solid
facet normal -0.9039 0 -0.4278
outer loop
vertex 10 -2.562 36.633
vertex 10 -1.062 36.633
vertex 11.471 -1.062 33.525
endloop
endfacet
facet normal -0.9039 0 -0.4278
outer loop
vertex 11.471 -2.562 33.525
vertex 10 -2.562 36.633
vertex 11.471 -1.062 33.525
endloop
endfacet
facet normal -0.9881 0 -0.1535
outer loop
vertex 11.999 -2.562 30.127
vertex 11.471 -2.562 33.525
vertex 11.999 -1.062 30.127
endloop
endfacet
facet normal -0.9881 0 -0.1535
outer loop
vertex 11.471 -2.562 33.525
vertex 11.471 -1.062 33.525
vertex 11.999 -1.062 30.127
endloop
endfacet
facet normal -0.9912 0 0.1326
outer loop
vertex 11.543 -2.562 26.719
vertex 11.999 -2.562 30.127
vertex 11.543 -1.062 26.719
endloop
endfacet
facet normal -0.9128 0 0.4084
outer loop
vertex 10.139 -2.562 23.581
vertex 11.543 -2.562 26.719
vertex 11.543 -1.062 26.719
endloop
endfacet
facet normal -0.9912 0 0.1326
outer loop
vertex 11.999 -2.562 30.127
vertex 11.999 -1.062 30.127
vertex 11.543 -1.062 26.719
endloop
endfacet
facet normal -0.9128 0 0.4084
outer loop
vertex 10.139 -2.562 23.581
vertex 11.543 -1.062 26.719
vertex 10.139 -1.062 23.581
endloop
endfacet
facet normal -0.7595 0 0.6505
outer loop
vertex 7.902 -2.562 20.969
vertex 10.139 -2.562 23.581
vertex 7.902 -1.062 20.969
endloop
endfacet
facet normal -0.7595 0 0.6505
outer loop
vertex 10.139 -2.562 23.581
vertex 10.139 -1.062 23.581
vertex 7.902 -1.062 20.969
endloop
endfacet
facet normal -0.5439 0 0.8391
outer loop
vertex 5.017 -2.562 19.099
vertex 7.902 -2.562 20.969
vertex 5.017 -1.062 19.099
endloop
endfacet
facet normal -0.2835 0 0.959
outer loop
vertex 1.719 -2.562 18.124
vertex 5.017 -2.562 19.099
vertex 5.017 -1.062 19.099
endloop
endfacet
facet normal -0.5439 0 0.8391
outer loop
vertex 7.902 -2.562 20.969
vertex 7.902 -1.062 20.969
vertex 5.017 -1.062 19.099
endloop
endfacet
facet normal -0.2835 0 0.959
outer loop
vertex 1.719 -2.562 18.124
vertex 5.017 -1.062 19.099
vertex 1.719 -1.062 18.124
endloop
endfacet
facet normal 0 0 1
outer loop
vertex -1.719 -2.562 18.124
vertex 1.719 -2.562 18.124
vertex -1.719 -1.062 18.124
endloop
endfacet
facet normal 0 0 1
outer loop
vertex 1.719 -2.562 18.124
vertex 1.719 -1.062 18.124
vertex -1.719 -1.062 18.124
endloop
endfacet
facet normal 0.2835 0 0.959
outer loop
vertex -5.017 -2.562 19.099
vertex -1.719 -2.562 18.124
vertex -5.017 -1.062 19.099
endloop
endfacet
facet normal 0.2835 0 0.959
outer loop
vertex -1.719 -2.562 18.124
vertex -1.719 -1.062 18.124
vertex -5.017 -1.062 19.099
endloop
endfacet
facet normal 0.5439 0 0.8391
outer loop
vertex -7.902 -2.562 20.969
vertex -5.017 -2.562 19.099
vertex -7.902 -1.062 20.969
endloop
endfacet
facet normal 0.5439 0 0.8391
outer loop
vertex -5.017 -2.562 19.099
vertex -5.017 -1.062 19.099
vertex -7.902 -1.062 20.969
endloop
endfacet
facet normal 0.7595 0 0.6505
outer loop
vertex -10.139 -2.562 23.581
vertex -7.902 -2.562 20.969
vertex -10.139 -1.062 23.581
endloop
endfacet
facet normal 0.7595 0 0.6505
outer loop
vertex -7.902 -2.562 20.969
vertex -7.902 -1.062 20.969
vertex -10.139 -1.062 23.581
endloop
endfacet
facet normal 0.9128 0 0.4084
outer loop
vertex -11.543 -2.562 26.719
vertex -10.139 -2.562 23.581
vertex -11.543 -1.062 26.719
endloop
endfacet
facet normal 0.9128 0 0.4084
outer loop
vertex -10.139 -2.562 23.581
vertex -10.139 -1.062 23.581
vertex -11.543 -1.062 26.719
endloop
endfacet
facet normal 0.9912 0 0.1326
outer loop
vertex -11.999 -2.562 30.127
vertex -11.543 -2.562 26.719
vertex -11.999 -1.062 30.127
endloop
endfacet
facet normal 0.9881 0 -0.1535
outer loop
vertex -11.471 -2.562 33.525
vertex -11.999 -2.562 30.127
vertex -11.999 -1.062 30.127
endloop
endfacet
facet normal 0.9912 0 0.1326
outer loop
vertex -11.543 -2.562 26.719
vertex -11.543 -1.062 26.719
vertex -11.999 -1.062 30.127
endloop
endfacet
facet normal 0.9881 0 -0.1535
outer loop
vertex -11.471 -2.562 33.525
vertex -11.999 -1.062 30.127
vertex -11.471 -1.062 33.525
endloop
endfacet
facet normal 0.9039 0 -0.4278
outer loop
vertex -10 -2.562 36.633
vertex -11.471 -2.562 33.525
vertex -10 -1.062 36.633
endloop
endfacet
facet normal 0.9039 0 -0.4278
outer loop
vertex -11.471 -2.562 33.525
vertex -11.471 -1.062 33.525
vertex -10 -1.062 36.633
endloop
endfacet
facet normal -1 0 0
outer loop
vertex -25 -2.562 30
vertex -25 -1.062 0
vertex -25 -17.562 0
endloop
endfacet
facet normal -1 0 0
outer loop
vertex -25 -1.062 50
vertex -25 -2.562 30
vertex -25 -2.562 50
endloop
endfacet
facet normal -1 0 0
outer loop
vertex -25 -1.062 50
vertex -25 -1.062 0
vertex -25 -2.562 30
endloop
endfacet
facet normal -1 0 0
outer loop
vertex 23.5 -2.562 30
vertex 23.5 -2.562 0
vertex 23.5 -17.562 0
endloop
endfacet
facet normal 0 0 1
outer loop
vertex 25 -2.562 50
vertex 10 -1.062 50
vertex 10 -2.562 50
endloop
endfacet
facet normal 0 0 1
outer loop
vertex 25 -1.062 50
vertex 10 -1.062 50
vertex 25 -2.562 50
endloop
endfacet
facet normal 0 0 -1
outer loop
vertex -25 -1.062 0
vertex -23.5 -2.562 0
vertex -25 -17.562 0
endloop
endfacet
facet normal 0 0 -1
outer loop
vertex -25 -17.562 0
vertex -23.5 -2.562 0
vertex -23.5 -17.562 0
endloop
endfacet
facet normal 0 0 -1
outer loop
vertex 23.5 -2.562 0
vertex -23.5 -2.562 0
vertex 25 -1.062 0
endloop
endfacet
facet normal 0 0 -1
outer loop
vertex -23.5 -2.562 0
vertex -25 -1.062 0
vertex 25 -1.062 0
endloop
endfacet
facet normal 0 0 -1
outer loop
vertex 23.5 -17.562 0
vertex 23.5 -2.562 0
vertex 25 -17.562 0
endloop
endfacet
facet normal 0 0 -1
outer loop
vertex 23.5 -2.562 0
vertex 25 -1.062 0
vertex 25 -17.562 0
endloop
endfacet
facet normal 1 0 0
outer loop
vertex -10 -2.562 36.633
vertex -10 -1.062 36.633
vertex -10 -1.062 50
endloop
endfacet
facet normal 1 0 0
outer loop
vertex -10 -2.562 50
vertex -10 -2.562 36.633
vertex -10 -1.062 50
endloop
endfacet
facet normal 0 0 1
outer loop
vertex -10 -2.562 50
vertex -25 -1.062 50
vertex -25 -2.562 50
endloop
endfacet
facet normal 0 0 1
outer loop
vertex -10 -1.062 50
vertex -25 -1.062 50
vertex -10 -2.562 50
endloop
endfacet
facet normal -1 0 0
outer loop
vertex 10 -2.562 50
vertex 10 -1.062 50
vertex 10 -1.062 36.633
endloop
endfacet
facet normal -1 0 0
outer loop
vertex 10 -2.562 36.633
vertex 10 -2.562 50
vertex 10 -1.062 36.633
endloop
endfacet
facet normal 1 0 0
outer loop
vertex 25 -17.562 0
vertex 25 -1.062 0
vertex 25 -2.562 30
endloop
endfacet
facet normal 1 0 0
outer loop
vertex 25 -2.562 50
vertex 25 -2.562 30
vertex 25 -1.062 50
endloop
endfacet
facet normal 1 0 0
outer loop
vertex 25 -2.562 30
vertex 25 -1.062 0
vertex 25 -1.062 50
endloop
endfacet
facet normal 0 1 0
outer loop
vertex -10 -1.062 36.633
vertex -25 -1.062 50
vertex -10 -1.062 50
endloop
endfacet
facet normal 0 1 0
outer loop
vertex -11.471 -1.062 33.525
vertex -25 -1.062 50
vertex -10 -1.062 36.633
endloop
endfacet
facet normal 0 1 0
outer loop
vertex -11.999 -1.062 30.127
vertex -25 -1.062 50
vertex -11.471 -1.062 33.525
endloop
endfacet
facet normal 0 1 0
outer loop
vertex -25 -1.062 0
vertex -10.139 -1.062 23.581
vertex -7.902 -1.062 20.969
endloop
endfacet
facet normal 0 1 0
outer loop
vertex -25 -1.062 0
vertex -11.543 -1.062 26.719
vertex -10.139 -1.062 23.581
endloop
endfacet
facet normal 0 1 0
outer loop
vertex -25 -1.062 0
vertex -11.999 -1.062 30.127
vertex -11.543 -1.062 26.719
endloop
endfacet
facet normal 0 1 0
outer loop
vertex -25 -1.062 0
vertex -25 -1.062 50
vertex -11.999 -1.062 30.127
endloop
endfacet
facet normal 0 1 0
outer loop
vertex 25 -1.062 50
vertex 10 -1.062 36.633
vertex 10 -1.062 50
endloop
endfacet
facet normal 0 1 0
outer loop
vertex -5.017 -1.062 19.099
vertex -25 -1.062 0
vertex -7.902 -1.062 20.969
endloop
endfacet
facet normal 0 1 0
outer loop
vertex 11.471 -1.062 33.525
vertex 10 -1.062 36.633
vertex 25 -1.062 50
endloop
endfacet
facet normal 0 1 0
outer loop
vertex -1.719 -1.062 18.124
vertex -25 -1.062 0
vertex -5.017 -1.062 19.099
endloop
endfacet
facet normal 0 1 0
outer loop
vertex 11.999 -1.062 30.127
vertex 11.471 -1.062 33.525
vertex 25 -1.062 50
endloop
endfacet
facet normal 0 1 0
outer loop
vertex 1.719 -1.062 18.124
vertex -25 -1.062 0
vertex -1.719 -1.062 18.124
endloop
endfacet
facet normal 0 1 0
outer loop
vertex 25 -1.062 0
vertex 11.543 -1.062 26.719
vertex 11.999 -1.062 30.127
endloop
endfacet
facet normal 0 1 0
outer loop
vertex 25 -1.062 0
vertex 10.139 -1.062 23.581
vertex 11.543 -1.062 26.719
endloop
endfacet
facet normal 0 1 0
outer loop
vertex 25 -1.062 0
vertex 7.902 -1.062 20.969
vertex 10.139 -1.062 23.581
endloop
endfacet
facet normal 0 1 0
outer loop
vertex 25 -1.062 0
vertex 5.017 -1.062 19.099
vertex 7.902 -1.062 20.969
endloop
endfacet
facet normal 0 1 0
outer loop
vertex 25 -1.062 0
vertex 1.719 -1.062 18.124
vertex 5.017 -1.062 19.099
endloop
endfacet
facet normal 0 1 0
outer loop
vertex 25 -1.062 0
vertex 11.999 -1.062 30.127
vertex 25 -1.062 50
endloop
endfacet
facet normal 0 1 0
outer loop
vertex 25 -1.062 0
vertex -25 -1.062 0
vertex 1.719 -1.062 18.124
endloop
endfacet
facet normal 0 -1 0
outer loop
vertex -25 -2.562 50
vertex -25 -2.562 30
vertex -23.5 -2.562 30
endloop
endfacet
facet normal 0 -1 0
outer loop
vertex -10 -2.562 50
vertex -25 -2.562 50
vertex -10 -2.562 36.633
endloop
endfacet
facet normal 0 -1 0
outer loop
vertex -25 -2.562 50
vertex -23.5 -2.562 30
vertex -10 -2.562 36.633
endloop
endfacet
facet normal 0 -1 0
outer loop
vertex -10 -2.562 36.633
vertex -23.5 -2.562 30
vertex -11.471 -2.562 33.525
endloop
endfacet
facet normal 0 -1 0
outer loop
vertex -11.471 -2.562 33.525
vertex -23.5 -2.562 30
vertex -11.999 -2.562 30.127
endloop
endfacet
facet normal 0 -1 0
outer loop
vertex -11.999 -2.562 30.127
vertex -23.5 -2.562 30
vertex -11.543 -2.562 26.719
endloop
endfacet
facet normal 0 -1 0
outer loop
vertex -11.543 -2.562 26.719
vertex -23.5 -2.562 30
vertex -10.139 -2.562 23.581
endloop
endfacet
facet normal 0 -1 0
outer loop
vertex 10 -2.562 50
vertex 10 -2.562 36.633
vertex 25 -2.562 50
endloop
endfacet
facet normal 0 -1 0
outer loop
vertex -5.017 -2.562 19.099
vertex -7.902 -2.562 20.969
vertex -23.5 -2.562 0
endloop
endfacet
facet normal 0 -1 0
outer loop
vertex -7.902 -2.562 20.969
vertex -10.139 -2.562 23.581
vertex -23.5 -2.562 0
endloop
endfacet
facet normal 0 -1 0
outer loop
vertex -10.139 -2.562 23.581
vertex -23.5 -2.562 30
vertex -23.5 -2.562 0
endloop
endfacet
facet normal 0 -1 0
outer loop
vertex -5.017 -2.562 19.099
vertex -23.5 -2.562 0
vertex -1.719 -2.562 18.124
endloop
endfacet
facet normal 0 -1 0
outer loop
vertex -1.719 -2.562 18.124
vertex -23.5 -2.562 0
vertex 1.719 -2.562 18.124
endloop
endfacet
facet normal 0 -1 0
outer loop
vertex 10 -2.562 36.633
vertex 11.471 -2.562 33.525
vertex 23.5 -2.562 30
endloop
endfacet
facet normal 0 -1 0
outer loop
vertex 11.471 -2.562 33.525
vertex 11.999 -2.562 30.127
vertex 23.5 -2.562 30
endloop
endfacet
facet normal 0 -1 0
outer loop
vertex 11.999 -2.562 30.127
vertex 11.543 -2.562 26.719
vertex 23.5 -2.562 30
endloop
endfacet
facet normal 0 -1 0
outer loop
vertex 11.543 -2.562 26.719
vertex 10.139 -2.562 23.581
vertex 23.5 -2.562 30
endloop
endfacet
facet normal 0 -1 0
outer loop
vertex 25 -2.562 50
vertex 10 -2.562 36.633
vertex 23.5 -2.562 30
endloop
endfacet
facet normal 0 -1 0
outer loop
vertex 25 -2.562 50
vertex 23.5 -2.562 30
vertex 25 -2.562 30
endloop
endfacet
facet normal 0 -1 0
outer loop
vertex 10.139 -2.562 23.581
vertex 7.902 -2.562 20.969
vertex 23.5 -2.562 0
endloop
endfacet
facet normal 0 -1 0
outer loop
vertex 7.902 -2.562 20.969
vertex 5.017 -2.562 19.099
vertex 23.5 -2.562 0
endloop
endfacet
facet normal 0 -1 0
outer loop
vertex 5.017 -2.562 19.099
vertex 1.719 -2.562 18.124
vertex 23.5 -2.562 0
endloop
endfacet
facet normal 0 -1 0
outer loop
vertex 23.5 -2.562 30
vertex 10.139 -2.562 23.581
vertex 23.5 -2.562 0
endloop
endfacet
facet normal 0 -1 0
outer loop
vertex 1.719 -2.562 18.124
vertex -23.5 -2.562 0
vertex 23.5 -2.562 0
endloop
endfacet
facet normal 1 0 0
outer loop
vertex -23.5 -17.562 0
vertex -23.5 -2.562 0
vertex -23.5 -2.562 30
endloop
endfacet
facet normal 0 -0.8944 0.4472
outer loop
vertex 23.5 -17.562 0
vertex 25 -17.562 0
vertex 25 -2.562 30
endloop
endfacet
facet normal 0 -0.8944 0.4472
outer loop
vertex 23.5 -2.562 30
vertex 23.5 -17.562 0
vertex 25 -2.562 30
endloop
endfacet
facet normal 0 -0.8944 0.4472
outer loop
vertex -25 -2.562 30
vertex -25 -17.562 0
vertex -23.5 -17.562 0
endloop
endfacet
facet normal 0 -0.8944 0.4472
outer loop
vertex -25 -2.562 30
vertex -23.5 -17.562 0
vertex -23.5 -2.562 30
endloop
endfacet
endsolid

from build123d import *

# Parameters (mm, degrees)
SKETCH1_W           = 50
SKETCH1_H           = 1.5
BOSS_EXTRUDE1_DEPTH = 50
CUT_EXTRUDE1_DEPTH  = 1.5
BOSS_EXTRUDE2_DEPTH = 1.5


with BuildPart() as part:
    # Sketch1 → Boss-Extrude1 (new body)
    with BuildSketch(Plane.XY):
        with Locations((0, -1.811768481)):
            Rectangle(SKETCH1_W, SKETCH1_H)
    extrude(amount=BOSS_EXTRUDE1_DEPTH)

    # Sketch2 → Cut-Extrude1 (cut)
    with BuildSketch(Plane(origin=(0, -1.061768481, 0), x_dir=(1, 0, 0), z_dir=(0, 1, 0))):
        with BuildLine():
            Line((-10, -36.633249581), (-10, -50))
            Line((-10, -50), (10, -50))
            Line((10, -50), (10, -36.633249581))
            ThreePointArc((10, -36.633249581), (0, -18), (-10, -36.633249581))
        make_face()
    extrude(amount=-CUT_EXTRUDE1_DEPTH, mode=Mode.SUBTRACT)

    # Sketch4 → Boss-Extrude2 (add)
    with BuildSketch(Plane.ZY.offset(25)):
        Polygon((0, -2.561768481), (0, -17.561768481), (30, -2.561768481), align=None)
    boss_extrude2 = extrude(amount=-BOSS_EXTRUDE2_DEPTH)

    # Mirror1: Boss-Extrude2 across plane
    add(boss_extrude2.mirror(Plane(origin=(0, 0, 0), x_dir=(0, 0, 1), z_dir=(1, 0, 0))))


solid = part.part
